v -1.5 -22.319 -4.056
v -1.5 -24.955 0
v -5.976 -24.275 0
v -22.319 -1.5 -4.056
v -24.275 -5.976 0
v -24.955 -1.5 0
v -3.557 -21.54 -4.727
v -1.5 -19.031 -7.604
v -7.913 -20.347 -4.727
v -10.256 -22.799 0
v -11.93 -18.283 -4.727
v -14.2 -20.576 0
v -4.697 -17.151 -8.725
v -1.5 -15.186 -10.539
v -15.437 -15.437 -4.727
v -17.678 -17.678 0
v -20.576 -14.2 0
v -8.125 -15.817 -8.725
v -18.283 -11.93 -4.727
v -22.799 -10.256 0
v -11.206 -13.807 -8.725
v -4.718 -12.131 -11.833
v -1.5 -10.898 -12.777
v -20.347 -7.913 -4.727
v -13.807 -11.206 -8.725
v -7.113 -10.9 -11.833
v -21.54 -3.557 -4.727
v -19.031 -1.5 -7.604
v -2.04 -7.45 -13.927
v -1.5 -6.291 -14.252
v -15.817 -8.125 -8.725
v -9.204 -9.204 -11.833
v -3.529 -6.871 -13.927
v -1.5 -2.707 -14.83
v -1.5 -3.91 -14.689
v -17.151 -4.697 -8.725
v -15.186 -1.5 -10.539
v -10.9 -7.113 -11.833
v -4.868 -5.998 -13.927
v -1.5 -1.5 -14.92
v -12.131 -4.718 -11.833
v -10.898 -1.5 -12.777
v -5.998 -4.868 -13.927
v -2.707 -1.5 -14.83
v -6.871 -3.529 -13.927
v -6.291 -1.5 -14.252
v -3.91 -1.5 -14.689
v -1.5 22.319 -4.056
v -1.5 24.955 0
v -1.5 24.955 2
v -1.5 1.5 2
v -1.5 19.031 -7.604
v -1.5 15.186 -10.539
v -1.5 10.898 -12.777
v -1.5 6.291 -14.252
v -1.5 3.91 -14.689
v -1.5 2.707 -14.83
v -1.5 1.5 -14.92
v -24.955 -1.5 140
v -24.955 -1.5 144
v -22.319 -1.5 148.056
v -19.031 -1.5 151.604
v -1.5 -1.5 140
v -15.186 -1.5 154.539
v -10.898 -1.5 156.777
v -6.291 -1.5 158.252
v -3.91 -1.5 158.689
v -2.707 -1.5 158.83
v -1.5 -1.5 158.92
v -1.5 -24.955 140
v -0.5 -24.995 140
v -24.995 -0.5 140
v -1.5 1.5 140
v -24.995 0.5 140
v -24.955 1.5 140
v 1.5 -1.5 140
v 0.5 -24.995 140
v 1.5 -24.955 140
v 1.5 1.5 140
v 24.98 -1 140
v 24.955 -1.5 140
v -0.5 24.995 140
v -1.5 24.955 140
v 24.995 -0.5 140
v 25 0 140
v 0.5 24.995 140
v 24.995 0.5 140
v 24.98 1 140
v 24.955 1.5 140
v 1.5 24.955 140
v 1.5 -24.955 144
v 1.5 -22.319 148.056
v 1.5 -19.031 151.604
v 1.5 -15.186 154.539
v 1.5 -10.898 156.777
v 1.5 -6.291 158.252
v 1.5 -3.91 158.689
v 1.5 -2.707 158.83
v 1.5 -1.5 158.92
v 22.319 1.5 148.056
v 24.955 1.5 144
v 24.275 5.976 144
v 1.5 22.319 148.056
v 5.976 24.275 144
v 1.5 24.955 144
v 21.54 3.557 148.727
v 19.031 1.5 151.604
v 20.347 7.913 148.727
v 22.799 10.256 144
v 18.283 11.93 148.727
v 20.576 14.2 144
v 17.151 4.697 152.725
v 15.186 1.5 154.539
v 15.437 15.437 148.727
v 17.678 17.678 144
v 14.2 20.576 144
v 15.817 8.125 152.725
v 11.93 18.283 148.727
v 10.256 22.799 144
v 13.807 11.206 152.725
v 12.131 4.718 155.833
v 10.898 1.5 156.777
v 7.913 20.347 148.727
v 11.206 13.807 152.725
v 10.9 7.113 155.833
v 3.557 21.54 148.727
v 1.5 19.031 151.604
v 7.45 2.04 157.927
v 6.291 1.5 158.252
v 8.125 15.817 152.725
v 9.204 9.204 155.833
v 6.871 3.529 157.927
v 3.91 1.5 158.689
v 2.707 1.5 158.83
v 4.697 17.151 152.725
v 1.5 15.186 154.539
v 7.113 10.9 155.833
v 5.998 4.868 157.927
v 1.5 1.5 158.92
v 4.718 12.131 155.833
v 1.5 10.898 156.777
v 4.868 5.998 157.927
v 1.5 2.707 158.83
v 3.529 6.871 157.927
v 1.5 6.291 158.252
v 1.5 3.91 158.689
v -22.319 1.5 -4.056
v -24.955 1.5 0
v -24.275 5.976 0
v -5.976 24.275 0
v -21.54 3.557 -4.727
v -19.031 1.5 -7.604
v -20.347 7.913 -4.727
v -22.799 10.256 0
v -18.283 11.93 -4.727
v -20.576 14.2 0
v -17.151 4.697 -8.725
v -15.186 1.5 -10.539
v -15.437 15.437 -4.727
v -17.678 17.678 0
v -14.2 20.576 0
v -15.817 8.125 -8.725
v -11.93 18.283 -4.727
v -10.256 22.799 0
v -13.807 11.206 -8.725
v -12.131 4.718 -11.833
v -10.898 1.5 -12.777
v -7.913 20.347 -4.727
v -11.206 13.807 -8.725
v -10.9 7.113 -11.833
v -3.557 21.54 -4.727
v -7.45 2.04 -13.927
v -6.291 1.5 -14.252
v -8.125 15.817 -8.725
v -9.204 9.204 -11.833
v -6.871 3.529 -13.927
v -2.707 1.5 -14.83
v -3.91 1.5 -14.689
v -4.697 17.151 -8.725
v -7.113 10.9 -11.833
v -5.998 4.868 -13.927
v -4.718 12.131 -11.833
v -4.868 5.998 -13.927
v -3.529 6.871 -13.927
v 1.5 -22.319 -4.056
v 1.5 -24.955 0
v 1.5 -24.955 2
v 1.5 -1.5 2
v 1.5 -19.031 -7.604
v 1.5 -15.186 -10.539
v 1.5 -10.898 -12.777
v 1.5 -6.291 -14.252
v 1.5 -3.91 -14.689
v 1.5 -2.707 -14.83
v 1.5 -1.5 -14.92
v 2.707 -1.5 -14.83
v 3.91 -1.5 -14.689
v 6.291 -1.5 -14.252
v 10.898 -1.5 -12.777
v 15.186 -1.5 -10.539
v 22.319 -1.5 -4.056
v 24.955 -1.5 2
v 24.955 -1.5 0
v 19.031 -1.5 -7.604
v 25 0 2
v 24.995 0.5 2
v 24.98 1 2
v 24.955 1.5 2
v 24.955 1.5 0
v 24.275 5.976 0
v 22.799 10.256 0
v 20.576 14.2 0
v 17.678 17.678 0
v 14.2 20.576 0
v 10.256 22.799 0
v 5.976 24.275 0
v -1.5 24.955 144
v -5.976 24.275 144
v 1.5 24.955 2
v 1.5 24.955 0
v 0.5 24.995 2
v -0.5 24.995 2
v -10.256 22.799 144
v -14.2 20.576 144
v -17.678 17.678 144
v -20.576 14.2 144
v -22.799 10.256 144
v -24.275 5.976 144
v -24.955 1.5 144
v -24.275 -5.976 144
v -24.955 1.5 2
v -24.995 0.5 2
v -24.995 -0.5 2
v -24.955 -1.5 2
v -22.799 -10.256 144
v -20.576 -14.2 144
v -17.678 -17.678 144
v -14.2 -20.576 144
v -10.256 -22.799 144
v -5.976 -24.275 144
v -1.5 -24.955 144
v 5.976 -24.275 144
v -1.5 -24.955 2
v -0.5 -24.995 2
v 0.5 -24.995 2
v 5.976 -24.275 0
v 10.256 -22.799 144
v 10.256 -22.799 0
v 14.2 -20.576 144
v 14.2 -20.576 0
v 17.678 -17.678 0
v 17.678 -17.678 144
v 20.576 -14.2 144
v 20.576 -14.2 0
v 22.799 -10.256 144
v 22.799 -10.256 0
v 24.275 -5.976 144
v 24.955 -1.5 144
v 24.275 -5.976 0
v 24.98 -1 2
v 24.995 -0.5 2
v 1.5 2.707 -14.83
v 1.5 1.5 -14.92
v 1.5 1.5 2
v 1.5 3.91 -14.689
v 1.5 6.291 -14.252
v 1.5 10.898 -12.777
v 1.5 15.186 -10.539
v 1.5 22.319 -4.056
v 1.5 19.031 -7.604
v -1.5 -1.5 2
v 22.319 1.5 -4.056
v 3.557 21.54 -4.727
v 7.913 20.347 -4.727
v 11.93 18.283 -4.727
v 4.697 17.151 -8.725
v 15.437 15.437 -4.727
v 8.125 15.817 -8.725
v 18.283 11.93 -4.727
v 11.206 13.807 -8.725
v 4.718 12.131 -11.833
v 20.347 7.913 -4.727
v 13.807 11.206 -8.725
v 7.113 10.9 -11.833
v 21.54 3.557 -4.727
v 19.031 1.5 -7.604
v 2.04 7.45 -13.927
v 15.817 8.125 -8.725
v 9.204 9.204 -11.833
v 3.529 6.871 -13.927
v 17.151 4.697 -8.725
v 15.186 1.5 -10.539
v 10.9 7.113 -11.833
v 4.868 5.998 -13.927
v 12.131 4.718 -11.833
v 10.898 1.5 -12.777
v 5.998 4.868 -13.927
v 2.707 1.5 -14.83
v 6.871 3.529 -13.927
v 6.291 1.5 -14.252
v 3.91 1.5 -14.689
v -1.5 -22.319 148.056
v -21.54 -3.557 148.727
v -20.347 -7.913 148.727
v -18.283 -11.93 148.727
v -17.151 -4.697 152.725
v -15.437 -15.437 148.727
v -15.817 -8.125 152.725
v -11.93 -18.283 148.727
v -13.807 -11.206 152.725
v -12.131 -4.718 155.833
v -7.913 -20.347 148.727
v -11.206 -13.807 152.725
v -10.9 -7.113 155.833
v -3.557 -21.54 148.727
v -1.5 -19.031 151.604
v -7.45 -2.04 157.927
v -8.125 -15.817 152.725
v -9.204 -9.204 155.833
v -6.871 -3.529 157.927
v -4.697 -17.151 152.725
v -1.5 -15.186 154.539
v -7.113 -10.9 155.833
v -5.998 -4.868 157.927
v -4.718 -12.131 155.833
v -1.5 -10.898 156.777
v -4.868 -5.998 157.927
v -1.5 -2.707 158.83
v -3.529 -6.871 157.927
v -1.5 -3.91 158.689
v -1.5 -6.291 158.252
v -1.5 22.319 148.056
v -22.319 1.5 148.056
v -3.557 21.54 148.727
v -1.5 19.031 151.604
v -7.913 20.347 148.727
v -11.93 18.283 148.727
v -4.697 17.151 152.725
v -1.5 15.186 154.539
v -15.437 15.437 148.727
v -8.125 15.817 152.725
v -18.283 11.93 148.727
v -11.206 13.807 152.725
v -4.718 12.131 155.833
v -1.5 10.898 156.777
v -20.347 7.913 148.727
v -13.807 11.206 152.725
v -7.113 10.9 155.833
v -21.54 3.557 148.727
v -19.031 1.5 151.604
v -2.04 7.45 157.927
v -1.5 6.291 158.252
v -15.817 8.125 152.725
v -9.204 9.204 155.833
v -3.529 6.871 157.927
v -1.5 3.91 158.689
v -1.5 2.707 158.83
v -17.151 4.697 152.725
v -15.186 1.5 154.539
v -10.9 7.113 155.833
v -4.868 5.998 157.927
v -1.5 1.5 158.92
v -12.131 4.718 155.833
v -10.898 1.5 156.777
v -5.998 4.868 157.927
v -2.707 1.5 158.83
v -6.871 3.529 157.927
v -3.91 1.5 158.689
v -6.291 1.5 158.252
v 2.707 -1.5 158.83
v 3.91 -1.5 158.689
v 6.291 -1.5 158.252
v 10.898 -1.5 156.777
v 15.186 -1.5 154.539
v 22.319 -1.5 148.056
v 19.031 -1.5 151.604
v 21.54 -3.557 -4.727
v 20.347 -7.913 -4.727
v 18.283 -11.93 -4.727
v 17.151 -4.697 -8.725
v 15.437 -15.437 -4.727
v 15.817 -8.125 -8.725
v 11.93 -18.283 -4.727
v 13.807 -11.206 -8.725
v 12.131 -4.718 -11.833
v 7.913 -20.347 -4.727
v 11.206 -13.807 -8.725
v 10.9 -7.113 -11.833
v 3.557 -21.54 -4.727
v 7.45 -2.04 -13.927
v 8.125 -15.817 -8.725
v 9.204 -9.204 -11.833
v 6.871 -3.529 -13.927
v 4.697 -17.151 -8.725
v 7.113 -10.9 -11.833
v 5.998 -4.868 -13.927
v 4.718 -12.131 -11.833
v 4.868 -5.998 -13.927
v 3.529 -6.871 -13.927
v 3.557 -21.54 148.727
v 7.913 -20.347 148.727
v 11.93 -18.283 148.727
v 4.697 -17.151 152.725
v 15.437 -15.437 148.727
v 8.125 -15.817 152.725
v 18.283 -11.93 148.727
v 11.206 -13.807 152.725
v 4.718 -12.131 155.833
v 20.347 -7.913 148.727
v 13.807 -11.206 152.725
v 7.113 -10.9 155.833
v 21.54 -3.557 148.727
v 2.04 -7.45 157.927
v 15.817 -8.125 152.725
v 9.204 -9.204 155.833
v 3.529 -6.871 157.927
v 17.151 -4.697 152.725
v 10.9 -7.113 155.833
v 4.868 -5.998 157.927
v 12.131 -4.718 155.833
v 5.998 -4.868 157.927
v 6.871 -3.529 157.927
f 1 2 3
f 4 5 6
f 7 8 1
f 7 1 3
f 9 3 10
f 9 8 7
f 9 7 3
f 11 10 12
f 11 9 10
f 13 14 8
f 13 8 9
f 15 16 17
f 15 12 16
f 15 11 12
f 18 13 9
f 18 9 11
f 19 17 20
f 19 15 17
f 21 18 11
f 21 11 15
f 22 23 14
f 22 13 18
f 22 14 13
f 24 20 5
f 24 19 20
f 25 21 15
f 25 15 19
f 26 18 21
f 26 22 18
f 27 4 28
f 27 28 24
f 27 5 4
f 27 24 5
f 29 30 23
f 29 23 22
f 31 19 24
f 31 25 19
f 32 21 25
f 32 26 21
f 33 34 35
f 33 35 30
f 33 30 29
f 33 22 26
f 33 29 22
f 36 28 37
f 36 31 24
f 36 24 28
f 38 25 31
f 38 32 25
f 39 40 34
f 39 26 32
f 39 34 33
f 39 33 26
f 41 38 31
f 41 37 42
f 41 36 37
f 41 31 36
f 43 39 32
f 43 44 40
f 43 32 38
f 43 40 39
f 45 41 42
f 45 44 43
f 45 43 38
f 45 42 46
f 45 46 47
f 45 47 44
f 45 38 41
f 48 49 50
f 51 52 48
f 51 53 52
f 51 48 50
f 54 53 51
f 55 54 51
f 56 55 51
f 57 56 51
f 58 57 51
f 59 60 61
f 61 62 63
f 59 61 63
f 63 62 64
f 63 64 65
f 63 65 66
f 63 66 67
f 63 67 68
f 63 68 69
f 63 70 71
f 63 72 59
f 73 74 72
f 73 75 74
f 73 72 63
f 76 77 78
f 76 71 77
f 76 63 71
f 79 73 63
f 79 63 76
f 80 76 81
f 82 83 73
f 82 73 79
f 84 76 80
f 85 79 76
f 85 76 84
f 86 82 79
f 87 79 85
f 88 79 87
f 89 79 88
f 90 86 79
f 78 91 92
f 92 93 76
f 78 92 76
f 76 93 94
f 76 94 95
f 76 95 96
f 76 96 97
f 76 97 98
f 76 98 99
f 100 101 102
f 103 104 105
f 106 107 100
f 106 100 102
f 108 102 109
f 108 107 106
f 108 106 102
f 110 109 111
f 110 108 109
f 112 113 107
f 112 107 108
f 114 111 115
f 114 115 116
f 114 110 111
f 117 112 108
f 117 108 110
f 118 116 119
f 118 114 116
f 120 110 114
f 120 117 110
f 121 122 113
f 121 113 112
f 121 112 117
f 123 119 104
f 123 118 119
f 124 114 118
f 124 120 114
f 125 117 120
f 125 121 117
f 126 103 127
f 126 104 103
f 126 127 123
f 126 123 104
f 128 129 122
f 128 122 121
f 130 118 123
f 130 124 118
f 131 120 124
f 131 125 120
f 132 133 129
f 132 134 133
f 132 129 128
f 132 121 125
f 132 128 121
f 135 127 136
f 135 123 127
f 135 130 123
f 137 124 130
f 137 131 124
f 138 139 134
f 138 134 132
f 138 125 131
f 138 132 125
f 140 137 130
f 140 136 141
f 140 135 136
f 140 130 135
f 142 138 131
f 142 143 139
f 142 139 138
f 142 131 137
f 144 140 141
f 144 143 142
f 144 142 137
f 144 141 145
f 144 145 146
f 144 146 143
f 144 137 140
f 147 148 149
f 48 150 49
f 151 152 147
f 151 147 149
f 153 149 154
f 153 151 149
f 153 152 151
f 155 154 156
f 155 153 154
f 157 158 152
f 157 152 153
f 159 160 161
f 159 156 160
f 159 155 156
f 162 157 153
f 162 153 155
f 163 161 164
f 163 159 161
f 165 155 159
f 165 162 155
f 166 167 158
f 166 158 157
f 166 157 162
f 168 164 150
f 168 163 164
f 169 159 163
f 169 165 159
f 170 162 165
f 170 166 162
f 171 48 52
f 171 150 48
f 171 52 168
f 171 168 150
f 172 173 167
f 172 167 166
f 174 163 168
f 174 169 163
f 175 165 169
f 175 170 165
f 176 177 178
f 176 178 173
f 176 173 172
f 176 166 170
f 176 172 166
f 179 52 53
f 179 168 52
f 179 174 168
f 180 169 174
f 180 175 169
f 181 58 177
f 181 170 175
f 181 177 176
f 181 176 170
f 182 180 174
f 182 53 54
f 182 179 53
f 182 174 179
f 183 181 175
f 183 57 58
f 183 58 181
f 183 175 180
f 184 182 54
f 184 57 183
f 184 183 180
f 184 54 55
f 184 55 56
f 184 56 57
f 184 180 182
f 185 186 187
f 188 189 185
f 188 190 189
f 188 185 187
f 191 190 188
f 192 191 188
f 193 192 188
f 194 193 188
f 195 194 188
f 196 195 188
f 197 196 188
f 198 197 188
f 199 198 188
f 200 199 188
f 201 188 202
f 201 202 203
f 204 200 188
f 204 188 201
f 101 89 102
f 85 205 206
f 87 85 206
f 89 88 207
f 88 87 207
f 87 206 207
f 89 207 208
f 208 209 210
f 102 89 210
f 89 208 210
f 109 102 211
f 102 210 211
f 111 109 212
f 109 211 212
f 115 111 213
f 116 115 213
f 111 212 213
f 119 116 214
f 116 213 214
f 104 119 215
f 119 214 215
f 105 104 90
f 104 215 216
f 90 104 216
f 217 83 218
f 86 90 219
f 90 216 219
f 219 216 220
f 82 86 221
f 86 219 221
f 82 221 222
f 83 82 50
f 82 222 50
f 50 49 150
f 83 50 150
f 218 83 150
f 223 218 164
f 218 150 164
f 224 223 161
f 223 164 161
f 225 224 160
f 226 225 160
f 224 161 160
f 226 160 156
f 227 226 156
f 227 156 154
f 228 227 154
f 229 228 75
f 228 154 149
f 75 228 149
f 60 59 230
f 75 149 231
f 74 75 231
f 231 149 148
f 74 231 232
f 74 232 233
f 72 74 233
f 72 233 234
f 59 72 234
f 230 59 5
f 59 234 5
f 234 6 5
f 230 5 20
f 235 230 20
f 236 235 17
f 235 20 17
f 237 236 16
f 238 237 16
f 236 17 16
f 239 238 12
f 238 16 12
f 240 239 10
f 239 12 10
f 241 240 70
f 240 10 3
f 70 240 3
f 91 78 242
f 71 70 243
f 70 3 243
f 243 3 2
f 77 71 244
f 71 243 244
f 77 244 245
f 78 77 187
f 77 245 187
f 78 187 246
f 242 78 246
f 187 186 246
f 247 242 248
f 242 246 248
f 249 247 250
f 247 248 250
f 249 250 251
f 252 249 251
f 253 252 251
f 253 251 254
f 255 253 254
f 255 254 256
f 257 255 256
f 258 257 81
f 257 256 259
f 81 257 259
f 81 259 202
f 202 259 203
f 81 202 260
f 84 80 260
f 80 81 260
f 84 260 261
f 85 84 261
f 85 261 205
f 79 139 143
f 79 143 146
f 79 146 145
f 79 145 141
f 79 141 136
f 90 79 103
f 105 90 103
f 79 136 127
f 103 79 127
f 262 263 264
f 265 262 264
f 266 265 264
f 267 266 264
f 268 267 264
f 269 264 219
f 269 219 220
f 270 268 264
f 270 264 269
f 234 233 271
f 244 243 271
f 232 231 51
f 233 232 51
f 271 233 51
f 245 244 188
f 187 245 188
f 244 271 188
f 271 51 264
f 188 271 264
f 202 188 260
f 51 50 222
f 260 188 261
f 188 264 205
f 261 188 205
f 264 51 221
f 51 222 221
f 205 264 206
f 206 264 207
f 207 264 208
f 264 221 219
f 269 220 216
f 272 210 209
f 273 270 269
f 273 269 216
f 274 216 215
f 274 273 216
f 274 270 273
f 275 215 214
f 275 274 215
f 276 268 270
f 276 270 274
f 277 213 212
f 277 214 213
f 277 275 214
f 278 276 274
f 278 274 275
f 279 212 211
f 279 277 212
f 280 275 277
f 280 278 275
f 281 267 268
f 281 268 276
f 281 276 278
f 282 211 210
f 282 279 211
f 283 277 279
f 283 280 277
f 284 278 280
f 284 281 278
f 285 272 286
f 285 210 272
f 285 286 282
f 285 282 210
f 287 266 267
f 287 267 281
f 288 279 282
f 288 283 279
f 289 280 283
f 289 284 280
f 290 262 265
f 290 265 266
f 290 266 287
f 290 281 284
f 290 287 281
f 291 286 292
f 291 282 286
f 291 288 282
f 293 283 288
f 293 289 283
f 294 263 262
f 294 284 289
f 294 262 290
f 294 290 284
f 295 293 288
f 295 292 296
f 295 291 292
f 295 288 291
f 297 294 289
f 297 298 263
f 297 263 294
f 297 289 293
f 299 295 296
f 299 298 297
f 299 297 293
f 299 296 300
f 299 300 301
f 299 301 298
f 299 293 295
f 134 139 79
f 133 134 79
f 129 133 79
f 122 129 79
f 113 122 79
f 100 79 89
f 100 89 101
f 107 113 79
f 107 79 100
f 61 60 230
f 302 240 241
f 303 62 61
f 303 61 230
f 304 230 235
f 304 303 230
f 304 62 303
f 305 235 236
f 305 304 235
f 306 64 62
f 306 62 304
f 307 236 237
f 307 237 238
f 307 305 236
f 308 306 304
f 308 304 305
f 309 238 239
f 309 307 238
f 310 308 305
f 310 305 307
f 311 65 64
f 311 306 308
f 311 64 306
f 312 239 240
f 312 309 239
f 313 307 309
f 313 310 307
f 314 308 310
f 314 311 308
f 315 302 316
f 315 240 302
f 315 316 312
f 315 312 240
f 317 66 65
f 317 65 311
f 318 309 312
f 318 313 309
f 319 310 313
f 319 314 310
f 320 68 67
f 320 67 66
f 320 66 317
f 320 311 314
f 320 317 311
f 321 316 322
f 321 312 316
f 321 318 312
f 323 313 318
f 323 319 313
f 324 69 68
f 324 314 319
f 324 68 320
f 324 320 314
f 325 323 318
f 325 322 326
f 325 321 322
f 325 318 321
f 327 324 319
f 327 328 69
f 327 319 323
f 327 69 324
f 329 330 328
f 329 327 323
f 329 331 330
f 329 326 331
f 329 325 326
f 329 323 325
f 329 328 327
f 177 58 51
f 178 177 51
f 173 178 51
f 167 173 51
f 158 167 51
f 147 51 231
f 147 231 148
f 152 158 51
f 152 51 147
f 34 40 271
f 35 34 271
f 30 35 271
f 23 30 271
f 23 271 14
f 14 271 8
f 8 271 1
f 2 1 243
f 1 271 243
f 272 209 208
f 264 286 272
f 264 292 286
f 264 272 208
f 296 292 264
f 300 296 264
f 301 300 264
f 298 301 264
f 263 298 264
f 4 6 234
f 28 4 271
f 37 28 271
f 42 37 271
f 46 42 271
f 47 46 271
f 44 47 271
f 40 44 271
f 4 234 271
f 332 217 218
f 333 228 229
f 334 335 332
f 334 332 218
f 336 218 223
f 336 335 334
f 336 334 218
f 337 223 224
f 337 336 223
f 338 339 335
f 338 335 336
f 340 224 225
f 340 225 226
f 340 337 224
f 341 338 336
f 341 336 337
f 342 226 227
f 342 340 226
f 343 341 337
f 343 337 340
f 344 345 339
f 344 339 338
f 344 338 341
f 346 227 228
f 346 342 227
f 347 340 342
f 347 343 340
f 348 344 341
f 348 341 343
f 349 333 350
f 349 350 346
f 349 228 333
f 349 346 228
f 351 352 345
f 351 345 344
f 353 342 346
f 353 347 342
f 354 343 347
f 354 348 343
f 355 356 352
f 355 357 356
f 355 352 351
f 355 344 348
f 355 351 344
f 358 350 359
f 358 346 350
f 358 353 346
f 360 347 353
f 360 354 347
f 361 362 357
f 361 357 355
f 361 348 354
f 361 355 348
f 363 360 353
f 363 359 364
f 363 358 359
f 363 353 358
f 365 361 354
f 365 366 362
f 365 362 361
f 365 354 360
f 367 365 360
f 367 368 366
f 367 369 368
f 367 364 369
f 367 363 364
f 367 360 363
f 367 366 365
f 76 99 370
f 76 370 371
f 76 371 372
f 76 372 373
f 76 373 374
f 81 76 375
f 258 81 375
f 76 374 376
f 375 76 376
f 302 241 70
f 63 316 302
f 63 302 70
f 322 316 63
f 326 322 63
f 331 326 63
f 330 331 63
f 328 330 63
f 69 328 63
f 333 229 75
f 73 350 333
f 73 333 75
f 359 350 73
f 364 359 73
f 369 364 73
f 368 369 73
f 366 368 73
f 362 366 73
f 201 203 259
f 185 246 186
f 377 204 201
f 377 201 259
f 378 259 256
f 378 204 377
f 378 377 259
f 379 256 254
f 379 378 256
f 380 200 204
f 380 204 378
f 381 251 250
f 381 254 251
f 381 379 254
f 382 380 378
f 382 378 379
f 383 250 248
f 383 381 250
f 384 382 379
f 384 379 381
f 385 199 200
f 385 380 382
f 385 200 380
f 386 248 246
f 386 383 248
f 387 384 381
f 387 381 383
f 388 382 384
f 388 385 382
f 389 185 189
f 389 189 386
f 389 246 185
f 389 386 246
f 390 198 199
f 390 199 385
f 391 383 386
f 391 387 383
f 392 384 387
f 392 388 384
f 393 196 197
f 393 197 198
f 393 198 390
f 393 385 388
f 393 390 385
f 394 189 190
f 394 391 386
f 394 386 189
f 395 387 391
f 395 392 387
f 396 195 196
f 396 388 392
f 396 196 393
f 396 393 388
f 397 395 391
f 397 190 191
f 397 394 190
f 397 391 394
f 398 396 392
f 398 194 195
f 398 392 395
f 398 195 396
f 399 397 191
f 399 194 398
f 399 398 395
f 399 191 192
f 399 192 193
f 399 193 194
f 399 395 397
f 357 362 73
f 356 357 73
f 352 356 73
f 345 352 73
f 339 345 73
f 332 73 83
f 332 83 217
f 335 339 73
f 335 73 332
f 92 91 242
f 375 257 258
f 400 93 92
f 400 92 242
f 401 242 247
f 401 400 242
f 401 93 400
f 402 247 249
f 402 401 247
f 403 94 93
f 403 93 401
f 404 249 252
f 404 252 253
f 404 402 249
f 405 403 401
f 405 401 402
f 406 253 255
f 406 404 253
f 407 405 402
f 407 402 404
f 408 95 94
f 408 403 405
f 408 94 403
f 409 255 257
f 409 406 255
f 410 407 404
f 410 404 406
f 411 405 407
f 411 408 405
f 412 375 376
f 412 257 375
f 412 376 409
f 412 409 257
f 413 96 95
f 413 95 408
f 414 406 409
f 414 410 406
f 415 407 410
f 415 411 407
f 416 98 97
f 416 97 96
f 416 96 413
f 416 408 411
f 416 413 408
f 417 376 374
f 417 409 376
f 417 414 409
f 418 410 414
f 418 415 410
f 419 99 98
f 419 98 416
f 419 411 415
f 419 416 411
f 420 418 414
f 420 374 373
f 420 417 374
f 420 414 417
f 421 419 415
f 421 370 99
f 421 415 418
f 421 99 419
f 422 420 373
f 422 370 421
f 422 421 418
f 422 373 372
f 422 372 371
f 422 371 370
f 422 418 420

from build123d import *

# Parameters (mm, degrees)
SKETCH1_R               = 25
BOSS_EXTRUDE1_DEPTH     = 144
DOME1_FACE_RADIUS       = 25
DOME1_HEIGHT            = 15
DOME2_FACE_RADIUS       = 25
DOME2_HEIGHT            = 15
CUT_EXTRUDE3_DEPTH      = 2
CUT_EXTRUDE3_DEPTH_BACK = 20
SKETCH3_W               = 3
SKETCH3_H               = 25.725601723
SKETCH3_W_2             = 25.013024677
SKETCH3_H_2             = 3
CUT_EXTRUDE4_DEPTH      = 30


with BuildPart() as part:
    # Sketch1 → Boss-Extrude1 (new body)
    with BuildSketch(Plane.XY):
        Circle(SKETCH1_R)
    extrude(amount=BOSS_EXTRUDE1_DEPTH)

    # Dome1: a dome of height H over a round flat face of radius A is a cap of a sphere of radius (A * A + H * H) / (2 * H)
    dome1_r = (DOME1_FACE_RADIUS * DOME1_FACE_RADIUS + DOME1_HEIGHT * DOME1_HEIGHT) / (2 * DOME1_HEIGHT)
    dome1_base = Plane((0, 0, 144), z_dir=(0, 0, 1))
    with Locations(dome1_base.offset(DOME1_HEIGHT - dome1_r)):
        dome1_ball = Sphere(dome1_r, mode=Mode.PRIVATE)
    add(split(dome1_ball, bisect_by=dome1_base, keep=Keep.TOP, mode=Mode.PRIVATE))

    # Dome2: a dome of height H over a round flat face of radius A is a cap of a sphere of radius (A * A + H * H) / (2 * H)
    dome2_r = (DOME2_FACE_RADIUS * DOME2_FACE_RADIUS + DOME2_HEIGHT * DOME2_HEIGHT) / (2 * DOME2_HEIGHT)
    dome2_base = Plane((0, 0, 0), z_dir=(0, 0, -1))
    with Locations(dome2_base.offset(DOME2_HEIGHT - dome2_r)):
        dome2_ball = Sphere(dome2_r, mode=Mode.PRIVATE)
    add(split(dome2_ball, bisect_by=dome2_base, keep=Keep.TOP, mode=Mode.PRIVATE))

    # Sketch2 → Cut-Extrude3 (cut, two sides)
    with BuildSketch(Plane.XY) as cut_extrude3_sk:
        with BuildLine():
            Line((-1.5, 24.954959427), (-1.5, 1.5))
            Line((-1.5, 1.5), (-24.954959427, 1.5))
            ThreePointArc((-24.954959427, 1.5), (-25, 0), (-24.954959427, -1.5))
            Line((-24.954959427, -1.5), (-1.5, -1.5))
            Line((-1.5, -1.5), (-1.5, -24.954959427))
            ThreePointArc((-1.5, -24.954959427), (0, -25), (1.5, -24.954959427))
            Line((1.5, -24.954959427), (1.5, -1.5))
            Line((1.5, -1.5), (24.954959427, -1.5))
            ThreePointArc((24.954959427, -1.5), (24.98873732, -0.750338033), (25, 0))
            ThreePointArc((25, 0), (24.98873732, 0.750338033), (24.954959427, 1.5))
            Line((24.954959427, 1.5), (1.5, 1.5))
            Line((1.5, 1.5), (1.5, 24.954959427))
            ThreePointArc((1.5, 24.954959427), (0, 25), (-1.5, 24.954959427))
        make_face()
    extrude(amount=CUT_EXTRUDE3_DEPTH, mode=Mode.SUBTRACT)
    extrude(cut_extrude3_sk.sketch, amount=-CUT_EXTRUDE3_DEPTH_BACK, mode=Mode.SUBTRACT)

    # Sketch3 → Cut-Extrude4 (cut)
    with BuildSketch(Plane.XY.offset(170)):
        with Locations((0, -14.362800862)):
            Rectangle(SKETCH3_W, SKETCH3_H)
        with Locations((0, 14.362800862)):
            Rectangle(SKETCH3_W, SKETCH3_H)
        with Locations((14.006512339, 0)):
            Rectangle(SKETCH3_W_2, SKETCH3_H_2)
        with Locations((-14.006512339, 0)):
            Rectangle(SKETCH3_W_2, SKETCH3_H_2)
        Rectangle(SKETCH3_W, SKETCH3_H_2)
    extrude(amount=-CUT_EXTRUDE4_DEPTH, mode=Mode.SUBTRACT)


solid = part.part
